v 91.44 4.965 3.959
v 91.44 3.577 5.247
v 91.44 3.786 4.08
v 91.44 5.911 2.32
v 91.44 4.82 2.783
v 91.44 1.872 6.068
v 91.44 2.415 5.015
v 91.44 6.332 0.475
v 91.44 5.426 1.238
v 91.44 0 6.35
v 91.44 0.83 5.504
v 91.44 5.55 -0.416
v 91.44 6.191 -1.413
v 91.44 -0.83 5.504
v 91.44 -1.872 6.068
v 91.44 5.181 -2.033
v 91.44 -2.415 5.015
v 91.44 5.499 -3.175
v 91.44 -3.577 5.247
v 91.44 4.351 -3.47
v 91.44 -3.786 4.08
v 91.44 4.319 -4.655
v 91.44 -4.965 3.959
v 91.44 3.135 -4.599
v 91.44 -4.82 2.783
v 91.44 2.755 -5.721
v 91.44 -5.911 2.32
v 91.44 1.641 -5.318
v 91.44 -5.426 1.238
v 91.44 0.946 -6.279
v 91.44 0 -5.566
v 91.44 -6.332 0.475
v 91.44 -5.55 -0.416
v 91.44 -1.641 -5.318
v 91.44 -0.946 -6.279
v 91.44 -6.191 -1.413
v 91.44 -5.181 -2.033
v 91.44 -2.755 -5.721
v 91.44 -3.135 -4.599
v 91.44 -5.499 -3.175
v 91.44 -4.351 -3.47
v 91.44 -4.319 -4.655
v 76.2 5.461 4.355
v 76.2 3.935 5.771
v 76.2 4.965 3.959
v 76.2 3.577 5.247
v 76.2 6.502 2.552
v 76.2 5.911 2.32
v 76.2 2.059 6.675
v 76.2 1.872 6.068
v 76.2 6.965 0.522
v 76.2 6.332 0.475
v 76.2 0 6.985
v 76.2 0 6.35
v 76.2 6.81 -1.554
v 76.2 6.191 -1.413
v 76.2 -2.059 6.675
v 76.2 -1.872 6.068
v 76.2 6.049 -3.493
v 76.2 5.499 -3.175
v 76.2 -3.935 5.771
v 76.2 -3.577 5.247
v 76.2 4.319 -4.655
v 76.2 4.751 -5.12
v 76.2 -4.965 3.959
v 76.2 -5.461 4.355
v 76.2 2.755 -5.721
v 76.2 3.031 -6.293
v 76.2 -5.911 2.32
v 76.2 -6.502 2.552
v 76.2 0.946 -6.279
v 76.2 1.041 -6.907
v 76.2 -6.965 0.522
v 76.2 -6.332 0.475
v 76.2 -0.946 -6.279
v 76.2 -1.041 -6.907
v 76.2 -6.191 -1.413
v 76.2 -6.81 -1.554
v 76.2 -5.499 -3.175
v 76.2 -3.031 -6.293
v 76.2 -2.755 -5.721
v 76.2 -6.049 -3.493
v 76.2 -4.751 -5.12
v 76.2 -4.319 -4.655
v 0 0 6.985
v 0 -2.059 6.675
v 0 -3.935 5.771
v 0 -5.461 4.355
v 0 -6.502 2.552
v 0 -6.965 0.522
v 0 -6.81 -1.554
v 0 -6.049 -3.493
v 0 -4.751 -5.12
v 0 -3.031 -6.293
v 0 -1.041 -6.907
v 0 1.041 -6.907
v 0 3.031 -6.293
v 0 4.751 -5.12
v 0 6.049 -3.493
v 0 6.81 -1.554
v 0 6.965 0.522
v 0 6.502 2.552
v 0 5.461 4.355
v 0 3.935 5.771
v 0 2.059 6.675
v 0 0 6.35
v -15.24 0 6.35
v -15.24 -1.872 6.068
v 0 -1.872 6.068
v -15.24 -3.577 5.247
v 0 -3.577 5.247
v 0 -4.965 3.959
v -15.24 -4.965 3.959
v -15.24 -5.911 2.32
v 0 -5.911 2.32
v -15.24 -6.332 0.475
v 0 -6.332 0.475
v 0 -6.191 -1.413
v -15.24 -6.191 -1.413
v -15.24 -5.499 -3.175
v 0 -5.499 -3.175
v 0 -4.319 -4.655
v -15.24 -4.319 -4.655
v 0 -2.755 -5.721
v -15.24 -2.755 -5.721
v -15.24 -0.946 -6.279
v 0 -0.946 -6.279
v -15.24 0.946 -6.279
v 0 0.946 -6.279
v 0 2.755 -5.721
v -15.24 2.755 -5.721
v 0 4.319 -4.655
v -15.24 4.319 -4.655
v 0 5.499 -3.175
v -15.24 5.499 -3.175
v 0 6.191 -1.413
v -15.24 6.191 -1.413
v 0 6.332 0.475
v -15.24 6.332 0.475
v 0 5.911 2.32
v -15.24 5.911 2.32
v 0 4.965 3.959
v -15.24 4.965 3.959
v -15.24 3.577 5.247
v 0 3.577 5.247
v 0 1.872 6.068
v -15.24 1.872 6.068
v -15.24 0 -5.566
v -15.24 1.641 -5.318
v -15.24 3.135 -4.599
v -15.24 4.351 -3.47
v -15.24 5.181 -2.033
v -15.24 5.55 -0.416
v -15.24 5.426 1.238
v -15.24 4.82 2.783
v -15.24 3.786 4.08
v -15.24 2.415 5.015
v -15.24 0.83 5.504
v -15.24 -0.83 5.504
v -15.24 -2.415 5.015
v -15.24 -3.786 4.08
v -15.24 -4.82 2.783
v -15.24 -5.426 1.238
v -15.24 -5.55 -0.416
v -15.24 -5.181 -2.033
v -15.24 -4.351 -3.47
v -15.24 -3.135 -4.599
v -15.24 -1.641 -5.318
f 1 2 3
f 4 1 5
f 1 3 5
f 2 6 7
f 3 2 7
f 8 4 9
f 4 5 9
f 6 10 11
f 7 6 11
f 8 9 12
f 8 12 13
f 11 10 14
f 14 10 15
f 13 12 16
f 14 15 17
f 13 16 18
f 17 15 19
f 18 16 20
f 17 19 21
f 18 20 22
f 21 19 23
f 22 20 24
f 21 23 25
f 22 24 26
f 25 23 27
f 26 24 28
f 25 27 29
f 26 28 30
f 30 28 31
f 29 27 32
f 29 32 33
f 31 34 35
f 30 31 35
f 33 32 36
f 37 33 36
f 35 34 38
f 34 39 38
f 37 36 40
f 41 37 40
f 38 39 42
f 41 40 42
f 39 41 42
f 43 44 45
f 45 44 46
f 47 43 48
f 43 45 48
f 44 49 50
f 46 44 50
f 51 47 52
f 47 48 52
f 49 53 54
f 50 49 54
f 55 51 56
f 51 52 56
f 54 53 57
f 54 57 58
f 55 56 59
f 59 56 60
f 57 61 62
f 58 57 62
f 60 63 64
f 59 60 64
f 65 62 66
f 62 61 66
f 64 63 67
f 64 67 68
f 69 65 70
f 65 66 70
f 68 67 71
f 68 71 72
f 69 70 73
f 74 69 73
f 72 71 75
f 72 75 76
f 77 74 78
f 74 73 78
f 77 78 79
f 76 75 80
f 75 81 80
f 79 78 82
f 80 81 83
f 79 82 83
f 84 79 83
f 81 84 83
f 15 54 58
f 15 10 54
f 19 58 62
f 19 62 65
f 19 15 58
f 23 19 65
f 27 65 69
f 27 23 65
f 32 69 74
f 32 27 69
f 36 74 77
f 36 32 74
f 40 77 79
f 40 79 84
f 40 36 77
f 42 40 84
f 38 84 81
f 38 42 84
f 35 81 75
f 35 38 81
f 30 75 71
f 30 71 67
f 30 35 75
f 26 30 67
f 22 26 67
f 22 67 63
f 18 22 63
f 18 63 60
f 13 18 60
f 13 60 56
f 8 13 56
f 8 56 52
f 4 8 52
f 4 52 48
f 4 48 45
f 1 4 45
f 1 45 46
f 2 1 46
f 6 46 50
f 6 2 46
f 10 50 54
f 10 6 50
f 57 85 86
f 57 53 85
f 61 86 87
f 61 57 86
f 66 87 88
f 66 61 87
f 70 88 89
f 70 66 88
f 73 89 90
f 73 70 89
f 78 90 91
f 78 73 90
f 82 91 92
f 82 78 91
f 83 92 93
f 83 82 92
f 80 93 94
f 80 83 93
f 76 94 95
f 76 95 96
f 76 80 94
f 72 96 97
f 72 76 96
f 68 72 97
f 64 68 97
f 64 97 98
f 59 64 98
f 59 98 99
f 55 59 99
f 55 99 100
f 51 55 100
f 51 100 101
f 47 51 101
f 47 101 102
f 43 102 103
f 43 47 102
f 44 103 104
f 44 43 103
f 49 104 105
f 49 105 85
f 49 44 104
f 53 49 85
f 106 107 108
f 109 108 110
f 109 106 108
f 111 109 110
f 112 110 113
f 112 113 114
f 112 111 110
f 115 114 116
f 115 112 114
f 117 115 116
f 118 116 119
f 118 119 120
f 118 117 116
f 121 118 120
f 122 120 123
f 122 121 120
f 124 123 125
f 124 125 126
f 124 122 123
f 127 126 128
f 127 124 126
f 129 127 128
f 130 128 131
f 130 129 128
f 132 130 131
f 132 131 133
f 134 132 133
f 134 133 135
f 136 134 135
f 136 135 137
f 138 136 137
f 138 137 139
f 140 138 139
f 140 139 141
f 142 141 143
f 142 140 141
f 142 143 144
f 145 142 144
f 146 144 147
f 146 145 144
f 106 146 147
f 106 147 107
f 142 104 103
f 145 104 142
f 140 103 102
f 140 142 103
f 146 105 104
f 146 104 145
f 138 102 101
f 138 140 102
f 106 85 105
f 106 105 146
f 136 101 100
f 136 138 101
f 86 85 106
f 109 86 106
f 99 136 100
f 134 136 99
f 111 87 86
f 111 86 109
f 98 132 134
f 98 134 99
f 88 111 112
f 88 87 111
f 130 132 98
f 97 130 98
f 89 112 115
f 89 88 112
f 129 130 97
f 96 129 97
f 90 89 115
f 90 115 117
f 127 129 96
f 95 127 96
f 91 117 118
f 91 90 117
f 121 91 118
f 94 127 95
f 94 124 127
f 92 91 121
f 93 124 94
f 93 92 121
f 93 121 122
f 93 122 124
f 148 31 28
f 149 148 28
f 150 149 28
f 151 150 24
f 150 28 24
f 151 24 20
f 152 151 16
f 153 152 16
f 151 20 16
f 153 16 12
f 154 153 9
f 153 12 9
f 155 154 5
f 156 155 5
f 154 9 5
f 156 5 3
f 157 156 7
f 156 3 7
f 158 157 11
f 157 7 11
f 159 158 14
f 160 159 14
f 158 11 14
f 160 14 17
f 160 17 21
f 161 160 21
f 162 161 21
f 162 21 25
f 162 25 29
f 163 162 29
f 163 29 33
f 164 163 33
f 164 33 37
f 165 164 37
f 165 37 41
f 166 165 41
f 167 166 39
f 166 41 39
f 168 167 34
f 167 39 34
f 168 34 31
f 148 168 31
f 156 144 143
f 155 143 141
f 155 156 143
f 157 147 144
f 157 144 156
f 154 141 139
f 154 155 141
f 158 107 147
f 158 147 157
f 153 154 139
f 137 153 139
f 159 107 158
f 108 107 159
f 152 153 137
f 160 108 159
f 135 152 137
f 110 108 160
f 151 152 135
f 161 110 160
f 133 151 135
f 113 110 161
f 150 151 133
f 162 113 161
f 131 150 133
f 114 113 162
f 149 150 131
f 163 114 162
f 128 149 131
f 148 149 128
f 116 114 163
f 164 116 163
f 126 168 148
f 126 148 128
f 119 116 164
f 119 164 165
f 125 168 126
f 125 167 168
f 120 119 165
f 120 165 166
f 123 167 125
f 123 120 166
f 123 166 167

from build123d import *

# Parameters (mm, degrees)
SKETCH1_W          = 76.2
SKETCH1_H          = 6.985
SKETCH1_W_2        = 15.24
SKETCH1_H_2        = 6.35
SKETCH2_R          = 5.565762573
CUT_EXTRUDE1_DEPTH = 106.68


with BuildPart() as part:
    # Sketch1 → Revolve1 (revolve)
    with BuildSketch(Plane.XY, mode=Mode.PRIVATE) as revolve1_sk:
        with Locations((38.1, 3.4925)):
            Rectangle(SKETCH1_W, SKETCH1_H)
        with Locations((83.82, 3.175)):
            Rectangle(SKETCH1_W_2, SKETCH1_H_2)
        with Locations((-7.62, 3.175)):
            Rectangle(SKETCH1_W_2, SKETCH1_H_2)
    revolve(revolve1_sk.sketch.rotate(Axis((-92.340325691, 0, 0), (1, 0, 0)), 90), axis=Axis((-92.340325691, 0, 0), (1, 0, 0)))

    # Sketch2 → Cut-Extrude1 (cut)
    with BuildSketch(Plane(origin=(91.44, 0, 0), x_dir=(0, 0, -1), z_dir=(1, 0, 0))):
        Circle(SKETCH2_R)
    extrude(amount=-CUT_EXTRUDE1_DEPTH, mode=Mode.SUBTRACT)


solid = part.part
